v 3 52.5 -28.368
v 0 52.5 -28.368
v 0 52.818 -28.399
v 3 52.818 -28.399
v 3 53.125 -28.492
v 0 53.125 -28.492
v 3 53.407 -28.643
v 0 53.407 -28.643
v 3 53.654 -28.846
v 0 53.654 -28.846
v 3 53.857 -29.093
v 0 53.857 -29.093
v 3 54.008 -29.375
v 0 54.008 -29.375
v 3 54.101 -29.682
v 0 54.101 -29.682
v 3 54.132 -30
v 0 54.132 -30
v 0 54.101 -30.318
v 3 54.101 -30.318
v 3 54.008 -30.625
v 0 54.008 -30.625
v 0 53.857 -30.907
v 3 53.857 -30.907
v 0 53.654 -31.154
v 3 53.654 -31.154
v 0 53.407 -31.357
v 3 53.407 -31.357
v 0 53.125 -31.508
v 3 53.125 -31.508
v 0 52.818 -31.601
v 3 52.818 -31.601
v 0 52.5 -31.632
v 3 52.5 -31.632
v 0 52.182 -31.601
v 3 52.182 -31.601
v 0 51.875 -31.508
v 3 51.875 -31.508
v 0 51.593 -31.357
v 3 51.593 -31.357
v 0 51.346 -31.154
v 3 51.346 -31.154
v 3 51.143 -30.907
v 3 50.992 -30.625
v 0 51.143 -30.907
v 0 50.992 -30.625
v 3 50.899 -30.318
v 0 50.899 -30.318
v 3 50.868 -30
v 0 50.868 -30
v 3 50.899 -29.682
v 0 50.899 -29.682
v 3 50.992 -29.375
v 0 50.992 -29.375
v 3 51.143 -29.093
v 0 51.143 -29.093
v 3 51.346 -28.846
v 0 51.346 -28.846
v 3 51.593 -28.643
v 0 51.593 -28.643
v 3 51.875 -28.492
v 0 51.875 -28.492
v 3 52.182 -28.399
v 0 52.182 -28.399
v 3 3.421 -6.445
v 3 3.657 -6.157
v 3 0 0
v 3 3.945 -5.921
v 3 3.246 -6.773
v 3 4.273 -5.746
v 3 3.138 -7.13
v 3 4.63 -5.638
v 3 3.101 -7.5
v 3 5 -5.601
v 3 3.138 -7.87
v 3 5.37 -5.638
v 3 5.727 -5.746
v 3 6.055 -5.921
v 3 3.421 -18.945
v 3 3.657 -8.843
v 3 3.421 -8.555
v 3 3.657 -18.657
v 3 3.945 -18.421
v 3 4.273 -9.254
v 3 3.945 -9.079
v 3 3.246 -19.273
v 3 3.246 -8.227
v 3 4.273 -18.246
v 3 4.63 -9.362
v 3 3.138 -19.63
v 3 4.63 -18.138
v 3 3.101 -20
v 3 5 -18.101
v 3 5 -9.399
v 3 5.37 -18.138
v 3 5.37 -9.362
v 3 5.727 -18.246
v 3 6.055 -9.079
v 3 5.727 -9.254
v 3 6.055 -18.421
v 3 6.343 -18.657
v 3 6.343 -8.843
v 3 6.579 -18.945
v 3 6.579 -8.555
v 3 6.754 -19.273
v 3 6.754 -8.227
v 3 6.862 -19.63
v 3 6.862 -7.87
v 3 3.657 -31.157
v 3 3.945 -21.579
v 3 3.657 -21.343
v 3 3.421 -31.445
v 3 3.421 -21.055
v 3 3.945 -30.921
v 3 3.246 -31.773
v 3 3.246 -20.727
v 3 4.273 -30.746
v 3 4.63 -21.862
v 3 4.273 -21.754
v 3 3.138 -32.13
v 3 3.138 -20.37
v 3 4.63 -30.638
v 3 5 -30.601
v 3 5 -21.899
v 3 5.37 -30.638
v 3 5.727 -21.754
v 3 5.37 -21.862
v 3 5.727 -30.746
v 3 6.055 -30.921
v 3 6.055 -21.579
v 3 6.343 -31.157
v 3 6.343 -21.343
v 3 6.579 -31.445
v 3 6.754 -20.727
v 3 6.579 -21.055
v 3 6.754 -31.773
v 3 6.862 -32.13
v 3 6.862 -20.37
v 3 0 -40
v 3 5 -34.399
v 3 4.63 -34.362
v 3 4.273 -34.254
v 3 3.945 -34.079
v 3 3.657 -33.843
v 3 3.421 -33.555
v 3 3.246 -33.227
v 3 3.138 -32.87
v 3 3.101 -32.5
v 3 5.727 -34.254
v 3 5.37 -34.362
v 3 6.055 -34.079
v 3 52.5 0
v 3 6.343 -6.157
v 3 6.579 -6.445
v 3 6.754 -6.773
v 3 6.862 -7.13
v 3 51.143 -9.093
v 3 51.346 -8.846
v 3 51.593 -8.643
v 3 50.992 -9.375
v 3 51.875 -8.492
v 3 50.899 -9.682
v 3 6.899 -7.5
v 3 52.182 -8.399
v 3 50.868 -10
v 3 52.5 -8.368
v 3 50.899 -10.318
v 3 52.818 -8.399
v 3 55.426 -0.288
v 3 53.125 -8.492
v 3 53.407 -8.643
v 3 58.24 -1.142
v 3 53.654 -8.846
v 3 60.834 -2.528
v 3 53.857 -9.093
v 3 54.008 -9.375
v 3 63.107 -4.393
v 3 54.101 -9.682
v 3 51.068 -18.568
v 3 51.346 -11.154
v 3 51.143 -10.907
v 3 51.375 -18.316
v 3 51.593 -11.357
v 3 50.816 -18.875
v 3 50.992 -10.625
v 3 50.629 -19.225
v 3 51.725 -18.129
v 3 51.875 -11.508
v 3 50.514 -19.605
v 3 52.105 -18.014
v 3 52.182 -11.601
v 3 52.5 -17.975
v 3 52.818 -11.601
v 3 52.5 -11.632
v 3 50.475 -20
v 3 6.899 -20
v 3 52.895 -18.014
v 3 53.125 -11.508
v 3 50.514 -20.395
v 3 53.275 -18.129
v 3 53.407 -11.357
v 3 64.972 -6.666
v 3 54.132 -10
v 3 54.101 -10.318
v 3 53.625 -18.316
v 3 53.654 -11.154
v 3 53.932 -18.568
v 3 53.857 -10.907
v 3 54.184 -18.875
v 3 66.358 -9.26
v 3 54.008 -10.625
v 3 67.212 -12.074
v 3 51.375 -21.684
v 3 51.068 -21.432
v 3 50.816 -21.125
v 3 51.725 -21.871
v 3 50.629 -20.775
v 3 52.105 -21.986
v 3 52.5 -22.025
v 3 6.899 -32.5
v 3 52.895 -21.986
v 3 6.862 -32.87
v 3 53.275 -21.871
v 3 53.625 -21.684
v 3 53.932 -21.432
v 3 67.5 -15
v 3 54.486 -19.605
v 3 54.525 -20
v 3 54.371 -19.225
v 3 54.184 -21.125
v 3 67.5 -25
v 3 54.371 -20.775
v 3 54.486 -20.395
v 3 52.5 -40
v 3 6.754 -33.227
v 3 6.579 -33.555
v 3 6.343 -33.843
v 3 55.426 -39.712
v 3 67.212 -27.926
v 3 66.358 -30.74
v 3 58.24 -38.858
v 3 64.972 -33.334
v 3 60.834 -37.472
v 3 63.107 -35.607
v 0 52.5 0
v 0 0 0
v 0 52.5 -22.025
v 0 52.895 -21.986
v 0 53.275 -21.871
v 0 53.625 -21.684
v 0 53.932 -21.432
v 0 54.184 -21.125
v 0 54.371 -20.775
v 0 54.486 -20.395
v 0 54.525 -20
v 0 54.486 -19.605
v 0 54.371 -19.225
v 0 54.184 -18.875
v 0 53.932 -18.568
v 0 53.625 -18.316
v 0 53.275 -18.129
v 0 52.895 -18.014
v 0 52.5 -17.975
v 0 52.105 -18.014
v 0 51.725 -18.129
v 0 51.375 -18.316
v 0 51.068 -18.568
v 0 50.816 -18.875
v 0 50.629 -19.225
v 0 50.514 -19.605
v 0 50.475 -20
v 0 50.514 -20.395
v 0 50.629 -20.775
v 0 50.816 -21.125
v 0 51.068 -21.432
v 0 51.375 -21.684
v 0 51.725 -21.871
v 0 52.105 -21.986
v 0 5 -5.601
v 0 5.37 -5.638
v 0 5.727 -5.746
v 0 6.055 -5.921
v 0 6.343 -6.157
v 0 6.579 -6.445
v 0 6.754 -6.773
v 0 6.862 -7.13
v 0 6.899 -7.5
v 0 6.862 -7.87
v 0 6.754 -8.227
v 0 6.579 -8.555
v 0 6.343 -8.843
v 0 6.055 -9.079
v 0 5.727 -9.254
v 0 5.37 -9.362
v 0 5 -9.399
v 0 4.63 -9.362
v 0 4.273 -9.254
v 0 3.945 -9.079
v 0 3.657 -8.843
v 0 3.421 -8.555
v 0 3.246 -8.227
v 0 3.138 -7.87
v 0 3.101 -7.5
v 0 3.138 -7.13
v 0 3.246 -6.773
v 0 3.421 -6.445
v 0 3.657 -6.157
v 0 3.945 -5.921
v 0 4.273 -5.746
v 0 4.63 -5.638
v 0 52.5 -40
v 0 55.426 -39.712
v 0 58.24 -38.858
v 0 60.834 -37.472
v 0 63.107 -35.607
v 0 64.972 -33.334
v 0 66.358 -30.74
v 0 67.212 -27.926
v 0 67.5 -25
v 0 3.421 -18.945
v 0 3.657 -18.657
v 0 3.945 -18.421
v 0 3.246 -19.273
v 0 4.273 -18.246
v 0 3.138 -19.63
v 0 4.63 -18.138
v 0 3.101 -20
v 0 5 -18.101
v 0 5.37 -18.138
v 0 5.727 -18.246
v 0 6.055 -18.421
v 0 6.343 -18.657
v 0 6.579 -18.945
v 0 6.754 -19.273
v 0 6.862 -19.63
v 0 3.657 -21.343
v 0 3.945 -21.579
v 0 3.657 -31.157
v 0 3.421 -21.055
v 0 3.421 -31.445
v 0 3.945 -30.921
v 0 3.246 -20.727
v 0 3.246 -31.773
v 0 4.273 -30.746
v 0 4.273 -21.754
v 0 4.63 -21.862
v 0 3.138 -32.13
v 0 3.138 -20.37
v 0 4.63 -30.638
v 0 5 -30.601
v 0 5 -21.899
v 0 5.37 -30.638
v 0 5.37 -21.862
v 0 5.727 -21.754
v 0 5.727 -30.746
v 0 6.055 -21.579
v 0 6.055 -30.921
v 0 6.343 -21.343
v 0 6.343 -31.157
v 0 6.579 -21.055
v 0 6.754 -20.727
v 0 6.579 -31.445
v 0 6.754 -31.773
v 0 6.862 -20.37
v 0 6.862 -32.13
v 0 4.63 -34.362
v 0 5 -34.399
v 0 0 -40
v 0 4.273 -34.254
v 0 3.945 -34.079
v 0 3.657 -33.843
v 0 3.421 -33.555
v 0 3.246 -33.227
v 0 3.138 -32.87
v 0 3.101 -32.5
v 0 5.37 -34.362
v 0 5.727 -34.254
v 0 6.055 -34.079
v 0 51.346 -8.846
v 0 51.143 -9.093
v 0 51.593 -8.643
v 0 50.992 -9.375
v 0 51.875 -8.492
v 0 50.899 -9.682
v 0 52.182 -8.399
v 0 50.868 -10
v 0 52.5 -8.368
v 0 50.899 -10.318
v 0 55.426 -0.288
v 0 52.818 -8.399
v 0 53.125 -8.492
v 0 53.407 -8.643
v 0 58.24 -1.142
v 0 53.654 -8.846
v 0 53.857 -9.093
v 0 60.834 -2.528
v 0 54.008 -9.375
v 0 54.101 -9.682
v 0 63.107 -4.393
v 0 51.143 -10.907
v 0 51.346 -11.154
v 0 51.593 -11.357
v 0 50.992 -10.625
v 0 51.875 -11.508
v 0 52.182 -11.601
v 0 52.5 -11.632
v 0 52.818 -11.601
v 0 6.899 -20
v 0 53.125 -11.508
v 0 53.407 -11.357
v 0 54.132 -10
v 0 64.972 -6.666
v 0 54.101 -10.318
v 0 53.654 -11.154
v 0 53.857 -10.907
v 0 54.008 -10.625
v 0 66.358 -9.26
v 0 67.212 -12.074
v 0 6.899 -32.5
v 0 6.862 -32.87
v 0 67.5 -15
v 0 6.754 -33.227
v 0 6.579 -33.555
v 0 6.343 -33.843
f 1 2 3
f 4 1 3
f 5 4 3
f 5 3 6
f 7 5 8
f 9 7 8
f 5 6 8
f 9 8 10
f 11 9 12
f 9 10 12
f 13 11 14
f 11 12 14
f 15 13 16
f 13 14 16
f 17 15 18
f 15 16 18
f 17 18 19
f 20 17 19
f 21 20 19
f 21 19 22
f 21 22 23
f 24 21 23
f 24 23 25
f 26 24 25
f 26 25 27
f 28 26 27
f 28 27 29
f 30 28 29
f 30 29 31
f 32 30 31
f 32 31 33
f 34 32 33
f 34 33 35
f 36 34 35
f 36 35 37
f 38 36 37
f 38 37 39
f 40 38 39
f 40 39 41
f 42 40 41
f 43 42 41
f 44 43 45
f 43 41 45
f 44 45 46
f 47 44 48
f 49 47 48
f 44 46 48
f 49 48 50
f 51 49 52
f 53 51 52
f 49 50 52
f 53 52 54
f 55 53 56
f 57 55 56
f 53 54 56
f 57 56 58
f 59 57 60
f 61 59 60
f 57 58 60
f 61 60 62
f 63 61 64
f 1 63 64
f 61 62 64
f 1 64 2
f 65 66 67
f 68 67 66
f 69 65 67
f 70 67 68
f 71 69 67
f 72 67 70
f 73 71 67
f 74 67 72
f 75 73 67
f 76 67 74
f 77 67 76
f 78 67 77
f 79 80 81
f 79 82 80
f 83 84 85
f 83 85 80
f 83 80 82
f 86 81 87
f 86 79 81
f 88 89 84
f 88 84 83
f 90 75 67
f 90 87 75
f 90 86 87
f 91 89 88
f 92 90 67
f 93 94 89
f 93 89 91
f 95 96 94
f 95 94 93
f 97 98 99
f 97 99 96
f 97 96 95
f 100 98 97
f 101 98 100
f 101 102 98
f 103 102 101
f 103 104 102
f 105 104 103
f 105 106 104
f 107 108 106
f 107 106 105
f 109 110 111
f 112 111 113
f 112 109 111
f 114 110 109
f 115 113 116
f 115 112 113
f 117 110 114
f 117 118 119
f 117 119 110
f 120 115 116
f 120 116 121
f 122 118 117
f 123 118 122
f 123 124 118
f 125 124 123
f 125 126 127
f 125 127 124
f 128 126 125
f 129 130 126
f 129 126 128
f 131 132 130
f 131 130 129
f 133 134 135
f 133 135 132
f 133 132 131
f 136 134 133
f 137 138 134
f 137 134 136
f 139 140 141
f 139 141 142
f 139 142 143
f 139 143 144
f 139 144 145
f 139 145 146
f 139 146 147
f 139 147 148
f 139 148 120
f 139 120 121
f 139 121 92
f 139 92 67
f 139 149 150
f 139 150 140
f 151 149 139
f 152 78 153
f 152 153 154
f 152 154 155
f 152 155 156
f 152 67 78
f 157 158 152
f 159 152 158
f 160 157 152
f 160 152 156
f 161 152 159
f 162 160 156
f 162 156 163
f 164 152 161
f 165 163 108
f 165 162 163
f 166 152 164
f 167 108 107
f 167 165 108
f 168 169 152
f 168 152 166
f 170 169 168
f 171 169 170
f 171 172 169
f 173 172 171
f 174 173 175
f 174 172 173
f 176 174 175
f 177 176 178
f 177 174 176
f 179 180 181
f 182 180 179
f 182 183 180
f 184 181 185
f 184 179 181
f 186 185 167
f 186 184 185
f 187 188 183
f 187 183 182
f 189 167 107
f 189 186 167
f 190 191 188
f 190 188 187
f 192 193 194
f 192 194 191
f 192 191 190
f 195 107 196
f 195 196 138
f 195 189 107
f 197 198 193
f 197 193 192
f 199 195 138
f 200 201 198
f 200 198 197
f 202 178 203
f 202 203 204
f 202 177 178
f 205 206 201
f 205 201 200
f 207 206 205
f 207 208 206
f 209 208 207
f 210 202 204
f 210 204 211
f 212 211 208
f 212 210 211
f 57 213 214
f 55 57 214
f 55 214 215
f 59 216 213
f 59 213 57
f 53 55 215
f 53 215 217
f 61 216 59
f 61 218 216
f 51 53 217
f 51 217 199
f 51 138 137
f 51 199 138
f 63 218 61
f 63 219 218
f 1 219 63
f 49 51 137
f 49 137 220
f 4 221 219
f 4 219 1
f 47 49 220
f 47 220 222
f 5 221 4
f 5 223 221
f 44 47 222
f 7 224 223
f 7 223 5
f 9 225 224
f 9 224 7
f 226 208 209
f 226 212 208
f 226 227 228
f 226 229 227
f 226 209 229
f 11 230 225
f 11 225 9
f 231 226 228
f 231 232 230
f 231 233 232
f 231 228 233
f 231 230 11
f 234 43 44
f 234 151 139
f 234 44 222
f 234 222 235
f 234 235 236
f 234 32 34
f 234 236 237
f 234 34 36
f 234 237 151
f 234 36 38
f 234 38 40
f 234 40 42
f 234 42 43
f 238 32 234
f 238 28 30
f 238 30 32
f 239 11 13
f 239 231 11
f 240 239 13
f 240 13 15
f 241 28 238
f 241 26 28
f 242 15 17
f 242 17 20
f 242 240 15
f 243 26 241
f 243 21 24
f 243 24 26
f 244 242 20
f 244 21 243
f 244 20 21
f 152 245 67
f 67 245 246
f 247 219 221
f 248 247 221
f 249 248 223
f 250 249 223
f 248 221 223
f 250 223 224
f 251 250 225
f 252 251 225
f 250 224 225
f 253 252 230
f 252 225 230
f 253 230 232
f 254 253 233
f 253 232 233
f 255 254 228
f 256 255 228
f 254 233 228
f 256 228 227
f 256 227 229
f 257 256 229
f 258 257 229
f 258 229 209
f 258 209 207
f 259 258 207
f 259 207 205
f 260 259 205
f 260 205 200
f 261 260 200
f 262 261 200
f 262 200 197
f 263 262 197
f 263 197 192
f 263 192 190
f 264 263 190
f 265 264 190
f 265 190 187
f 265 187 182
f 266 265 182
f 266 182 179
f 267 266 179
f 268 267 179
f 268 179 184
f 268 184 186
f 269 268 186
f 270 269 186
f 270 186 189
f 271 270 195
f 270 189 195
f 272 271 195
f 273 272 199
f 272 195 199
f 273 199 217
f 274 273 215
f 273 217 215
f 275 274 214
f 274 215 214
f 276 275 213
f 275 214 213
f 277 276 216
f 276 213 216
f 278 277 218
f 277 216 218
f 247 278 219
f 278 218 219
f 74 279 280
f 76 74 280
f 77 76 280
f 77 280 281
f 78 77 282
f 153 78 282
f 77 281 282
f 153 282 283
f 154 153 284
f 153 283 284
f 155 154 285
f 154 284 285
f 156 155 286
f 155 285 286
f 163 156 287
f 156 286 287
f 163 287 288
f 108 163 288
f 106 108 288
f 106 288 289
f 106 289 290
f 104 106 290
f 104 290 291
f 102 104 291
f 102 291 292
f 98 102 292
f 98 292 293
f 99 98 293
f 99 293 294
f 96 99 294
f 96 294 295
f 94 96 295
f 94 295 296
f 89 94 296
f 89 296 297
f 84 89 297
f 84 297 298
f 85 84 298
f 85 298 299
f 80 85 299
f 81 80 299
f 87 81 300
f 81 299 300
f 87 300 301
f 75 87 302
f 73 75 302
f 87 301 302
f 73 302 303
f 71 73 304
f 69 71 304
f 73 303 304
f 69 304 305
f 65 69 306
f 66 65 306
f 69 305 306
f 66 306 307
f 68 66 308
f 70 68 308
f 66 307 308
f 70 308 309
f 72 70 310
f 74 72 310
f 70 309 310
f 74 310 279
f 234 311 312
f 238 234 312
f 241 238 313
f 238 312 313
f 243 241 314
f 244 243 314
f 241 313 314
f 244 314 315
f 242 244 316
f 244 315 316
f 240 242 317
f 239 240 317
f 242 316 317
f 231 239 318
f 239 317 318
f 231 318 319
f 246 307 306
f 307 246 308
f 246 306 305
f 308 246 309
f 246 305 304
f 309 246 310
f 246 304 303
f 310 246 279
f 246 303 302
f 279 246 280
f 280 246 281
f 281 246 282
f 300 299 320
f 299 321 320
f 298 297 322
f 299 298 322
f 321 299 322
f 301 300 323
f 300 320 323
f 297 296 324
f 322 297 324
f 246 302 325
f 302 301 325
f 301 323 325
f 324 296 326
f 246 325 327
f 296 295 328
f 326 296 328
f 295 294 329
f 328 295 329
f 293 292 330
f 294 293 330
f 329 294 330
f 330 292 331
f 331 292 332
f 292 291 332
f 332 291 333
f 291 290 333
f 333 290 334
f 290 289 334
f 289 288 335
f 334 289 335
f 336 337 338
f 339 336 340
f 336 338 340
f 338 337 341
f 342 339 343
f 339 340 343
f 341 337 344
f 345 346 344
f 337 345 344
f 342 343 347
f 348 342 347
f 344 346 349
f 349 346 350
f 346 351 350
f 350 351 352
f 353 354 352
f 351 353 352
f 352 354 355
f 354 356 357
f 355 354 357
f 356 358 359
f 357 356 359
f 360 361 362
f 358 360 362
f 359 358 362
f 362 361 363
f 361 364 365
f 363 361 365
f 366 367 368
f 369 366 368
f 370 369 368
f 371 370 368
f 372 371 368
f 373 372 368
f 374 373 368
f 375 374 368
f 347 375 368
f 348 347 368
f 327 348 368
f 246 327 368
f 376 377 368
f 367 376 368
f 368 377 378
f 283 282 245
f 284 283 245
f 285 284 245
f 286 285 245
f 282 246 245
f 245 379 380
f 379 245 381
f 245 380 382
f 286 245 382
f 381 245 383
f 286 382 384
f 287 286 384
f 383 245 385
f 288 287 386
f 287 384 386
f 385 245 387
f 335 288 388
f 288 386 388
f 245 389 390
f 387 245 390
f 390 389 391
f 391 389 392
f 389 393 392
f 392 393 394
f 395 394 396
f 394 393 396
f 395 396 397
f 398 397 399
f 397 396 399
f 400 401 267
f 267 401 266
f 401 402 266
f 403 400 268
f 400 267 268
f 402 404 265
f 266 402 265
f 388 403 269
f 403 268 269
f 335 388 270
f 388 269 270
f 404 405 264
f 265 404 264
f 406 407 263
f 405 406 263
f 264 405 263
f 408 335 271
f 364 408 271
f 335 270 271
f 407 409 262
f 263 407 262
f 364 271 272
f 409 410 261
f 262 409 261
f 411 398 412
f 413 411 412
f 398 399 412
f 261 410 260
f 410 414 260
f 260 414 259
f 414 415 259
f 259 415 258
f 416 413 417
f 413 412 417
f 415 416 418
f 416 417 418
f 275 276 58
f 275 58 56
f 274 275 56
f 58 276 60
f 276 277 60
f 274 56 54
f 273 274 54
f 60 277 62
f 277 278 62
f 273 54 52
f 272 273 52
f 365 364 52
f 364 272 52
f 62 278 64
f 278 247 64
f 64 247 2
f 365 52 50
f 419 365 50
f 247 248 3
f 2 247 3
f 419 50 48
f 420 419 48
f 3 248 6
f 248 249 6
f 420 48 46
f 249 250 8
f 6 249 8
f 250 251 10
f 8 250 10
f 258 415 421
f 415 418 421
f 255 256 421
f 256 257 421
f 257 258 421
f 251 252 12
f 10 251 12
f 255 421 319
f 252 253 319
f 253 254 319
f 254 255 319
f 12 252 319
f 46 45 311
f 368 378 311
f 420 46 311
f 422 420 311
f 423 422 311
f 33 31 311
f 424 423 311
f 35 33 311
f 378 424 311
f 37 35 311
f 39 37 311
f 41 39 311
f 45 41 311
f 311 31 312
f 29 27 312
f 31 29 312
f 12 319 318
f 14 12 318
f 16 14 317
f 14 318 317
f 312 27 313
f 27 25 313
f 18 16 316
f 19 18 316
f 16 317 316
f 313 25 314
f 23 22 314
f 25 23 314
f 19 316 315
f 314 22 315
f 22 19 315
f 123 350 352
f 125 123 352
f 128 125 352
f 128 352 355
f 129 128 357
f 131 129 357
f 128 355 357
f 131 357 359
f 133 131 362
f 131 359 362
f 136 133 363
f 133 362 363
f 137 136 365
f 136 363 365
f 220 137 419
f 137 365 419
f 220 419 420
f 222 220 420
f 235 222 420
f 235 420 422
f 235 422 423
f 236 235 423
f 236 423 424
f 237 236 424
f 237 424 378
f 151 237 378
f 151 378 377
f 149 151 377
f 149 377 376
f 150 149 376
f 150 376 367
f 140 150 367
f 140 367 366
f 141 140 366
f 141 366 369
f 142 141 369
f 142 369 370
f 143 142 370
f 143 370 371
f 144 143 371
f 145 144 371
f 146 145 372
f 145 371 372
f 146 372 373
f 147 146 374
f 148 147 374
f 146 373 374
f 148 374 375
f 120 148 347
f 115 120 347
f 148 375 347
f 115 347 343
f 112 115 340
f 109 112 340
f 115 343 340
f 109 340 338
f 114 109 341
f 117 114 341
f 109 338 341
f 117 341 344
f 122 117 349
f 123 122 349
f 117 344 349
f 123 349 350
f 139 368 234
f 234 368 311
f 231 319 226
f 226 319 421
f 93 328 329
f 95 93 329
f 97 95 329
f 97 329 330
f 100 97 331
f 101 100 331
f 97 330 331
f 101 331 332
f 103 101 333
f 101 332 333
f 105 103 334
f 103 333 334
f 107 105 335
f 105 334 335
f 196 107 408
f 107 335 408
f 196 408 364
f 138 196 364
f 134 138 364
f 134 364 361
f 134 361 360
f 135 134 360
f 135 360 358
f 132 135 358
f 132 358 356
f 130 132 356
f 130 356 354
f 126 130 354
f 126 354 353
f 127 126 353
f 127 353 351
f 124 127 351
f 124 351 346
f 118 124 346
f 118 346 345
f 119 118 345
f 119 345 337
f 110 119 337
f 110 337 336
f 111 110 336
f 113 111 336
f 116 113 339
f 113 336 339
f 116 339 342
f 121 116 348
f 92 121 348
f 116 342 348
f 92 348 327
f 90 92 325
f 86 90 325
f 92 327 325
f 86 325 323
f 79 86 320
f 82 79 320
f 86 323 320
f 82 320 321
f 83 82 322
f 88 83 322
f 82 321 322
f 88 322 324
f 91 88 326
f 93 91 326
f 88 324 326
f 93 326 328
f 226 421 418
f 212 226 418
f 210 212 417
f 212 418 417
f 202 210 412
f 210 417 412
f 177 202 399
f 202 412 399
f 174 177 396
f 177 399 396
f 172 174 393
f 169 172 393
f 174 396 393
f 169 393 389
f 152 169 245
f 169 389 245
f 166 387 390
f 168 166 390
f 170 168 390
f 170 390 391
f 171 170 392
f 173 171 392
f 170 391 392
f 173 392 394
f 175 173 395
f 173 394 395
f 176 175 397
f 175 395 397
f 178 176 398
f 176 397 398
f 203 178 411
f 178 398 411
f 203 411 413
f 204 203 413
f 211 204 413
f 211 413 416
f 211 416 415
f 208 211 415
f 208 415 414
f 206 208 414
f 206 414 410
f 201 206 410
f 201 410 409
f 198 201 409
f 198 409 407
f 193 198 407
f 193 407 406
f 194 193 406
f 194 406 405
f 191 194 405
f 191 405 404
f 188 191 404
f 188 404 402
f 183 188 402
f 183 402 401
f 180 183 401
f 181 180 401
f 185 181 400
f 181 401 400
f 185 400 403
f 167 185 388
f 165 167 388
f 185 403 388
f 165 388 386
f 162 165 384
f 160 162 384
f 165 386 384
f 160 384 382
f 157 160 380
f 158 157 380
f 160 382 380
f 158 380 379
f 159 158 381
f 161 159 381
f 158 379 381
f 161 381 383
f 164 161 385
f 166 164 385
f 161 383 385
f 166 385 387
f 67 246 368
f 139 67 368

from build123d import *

# Parameters (mm, degrees)
BOSS_EXTRUDE1_DEPTH   = 3
F_6_CLEARANCE_HOLE2_D = 3.7973
SKETCH10_R            = 2.025
CUT_EXTRUDE1_DEPTH    = 10
F_4_CLEARANCE_HOLE3_D = 3.2639


with BuildPart() as part:
    # Sketch1 → Boss-Extrude1 (new body)
    with BuildSketch(Plane(origin=(0, 0, 0), x_dir=(0, 0, -1), z_dir=(1, 0, 0))):
        with BuildLine():
            Line((0, 0), (40, 0))
            Line((40, 0), (40, 52.5))
            ThreePointArc((40, 52.5), (35.606601718, 63.106601718), (25, 67.5))
            Line((25, 67.5), (15, 67.5))
            ThreePointArc((15, 67.5), (4.393398282, 63.106601718), (0, 52.5))
            Line((0, 52.5), (0, 0))
        make_face()
    extrude(amount=BOSS_EXTRUDE1_DEPTH)

    # #6 Clearance Hole2 (through all)
    with Locations(Plane(origin=(3, 0, 0), x_dir=(0, 0, -1), z_dir=(1, 0, 0))):
        with Locations((7.5, 5), (20, 5), (32.5, 5)):
            Hole(F_6_CLEARANCE_HOLE2_D / 2)

    # Sketch10 → Cut-Extrude1 (cut)
    with BuildSketch(Plane(origin=(3, 0, 0), x_dir=(0, 0, -1), z_dir=(1, 0, 0))):
        with Locations((20, 52.5)):
            Circle(SKETCH10_R)
    extrude(amount=-CUT_EXTRUDE1_DEPTH, mode=Mode.SUBTRACT)

    # #4 Clearance Hole3 (through all)
    with Locations(Plane(origin=(3, 0, 0), x_dir=(0, 0, -1), z_dir=(1, 0, 0))):
        with Locations((10, 52.5), (30, 52.5)):
            Hole(F_4_CLEARANCE_HOLE3_D / 2)


solid = part.part
